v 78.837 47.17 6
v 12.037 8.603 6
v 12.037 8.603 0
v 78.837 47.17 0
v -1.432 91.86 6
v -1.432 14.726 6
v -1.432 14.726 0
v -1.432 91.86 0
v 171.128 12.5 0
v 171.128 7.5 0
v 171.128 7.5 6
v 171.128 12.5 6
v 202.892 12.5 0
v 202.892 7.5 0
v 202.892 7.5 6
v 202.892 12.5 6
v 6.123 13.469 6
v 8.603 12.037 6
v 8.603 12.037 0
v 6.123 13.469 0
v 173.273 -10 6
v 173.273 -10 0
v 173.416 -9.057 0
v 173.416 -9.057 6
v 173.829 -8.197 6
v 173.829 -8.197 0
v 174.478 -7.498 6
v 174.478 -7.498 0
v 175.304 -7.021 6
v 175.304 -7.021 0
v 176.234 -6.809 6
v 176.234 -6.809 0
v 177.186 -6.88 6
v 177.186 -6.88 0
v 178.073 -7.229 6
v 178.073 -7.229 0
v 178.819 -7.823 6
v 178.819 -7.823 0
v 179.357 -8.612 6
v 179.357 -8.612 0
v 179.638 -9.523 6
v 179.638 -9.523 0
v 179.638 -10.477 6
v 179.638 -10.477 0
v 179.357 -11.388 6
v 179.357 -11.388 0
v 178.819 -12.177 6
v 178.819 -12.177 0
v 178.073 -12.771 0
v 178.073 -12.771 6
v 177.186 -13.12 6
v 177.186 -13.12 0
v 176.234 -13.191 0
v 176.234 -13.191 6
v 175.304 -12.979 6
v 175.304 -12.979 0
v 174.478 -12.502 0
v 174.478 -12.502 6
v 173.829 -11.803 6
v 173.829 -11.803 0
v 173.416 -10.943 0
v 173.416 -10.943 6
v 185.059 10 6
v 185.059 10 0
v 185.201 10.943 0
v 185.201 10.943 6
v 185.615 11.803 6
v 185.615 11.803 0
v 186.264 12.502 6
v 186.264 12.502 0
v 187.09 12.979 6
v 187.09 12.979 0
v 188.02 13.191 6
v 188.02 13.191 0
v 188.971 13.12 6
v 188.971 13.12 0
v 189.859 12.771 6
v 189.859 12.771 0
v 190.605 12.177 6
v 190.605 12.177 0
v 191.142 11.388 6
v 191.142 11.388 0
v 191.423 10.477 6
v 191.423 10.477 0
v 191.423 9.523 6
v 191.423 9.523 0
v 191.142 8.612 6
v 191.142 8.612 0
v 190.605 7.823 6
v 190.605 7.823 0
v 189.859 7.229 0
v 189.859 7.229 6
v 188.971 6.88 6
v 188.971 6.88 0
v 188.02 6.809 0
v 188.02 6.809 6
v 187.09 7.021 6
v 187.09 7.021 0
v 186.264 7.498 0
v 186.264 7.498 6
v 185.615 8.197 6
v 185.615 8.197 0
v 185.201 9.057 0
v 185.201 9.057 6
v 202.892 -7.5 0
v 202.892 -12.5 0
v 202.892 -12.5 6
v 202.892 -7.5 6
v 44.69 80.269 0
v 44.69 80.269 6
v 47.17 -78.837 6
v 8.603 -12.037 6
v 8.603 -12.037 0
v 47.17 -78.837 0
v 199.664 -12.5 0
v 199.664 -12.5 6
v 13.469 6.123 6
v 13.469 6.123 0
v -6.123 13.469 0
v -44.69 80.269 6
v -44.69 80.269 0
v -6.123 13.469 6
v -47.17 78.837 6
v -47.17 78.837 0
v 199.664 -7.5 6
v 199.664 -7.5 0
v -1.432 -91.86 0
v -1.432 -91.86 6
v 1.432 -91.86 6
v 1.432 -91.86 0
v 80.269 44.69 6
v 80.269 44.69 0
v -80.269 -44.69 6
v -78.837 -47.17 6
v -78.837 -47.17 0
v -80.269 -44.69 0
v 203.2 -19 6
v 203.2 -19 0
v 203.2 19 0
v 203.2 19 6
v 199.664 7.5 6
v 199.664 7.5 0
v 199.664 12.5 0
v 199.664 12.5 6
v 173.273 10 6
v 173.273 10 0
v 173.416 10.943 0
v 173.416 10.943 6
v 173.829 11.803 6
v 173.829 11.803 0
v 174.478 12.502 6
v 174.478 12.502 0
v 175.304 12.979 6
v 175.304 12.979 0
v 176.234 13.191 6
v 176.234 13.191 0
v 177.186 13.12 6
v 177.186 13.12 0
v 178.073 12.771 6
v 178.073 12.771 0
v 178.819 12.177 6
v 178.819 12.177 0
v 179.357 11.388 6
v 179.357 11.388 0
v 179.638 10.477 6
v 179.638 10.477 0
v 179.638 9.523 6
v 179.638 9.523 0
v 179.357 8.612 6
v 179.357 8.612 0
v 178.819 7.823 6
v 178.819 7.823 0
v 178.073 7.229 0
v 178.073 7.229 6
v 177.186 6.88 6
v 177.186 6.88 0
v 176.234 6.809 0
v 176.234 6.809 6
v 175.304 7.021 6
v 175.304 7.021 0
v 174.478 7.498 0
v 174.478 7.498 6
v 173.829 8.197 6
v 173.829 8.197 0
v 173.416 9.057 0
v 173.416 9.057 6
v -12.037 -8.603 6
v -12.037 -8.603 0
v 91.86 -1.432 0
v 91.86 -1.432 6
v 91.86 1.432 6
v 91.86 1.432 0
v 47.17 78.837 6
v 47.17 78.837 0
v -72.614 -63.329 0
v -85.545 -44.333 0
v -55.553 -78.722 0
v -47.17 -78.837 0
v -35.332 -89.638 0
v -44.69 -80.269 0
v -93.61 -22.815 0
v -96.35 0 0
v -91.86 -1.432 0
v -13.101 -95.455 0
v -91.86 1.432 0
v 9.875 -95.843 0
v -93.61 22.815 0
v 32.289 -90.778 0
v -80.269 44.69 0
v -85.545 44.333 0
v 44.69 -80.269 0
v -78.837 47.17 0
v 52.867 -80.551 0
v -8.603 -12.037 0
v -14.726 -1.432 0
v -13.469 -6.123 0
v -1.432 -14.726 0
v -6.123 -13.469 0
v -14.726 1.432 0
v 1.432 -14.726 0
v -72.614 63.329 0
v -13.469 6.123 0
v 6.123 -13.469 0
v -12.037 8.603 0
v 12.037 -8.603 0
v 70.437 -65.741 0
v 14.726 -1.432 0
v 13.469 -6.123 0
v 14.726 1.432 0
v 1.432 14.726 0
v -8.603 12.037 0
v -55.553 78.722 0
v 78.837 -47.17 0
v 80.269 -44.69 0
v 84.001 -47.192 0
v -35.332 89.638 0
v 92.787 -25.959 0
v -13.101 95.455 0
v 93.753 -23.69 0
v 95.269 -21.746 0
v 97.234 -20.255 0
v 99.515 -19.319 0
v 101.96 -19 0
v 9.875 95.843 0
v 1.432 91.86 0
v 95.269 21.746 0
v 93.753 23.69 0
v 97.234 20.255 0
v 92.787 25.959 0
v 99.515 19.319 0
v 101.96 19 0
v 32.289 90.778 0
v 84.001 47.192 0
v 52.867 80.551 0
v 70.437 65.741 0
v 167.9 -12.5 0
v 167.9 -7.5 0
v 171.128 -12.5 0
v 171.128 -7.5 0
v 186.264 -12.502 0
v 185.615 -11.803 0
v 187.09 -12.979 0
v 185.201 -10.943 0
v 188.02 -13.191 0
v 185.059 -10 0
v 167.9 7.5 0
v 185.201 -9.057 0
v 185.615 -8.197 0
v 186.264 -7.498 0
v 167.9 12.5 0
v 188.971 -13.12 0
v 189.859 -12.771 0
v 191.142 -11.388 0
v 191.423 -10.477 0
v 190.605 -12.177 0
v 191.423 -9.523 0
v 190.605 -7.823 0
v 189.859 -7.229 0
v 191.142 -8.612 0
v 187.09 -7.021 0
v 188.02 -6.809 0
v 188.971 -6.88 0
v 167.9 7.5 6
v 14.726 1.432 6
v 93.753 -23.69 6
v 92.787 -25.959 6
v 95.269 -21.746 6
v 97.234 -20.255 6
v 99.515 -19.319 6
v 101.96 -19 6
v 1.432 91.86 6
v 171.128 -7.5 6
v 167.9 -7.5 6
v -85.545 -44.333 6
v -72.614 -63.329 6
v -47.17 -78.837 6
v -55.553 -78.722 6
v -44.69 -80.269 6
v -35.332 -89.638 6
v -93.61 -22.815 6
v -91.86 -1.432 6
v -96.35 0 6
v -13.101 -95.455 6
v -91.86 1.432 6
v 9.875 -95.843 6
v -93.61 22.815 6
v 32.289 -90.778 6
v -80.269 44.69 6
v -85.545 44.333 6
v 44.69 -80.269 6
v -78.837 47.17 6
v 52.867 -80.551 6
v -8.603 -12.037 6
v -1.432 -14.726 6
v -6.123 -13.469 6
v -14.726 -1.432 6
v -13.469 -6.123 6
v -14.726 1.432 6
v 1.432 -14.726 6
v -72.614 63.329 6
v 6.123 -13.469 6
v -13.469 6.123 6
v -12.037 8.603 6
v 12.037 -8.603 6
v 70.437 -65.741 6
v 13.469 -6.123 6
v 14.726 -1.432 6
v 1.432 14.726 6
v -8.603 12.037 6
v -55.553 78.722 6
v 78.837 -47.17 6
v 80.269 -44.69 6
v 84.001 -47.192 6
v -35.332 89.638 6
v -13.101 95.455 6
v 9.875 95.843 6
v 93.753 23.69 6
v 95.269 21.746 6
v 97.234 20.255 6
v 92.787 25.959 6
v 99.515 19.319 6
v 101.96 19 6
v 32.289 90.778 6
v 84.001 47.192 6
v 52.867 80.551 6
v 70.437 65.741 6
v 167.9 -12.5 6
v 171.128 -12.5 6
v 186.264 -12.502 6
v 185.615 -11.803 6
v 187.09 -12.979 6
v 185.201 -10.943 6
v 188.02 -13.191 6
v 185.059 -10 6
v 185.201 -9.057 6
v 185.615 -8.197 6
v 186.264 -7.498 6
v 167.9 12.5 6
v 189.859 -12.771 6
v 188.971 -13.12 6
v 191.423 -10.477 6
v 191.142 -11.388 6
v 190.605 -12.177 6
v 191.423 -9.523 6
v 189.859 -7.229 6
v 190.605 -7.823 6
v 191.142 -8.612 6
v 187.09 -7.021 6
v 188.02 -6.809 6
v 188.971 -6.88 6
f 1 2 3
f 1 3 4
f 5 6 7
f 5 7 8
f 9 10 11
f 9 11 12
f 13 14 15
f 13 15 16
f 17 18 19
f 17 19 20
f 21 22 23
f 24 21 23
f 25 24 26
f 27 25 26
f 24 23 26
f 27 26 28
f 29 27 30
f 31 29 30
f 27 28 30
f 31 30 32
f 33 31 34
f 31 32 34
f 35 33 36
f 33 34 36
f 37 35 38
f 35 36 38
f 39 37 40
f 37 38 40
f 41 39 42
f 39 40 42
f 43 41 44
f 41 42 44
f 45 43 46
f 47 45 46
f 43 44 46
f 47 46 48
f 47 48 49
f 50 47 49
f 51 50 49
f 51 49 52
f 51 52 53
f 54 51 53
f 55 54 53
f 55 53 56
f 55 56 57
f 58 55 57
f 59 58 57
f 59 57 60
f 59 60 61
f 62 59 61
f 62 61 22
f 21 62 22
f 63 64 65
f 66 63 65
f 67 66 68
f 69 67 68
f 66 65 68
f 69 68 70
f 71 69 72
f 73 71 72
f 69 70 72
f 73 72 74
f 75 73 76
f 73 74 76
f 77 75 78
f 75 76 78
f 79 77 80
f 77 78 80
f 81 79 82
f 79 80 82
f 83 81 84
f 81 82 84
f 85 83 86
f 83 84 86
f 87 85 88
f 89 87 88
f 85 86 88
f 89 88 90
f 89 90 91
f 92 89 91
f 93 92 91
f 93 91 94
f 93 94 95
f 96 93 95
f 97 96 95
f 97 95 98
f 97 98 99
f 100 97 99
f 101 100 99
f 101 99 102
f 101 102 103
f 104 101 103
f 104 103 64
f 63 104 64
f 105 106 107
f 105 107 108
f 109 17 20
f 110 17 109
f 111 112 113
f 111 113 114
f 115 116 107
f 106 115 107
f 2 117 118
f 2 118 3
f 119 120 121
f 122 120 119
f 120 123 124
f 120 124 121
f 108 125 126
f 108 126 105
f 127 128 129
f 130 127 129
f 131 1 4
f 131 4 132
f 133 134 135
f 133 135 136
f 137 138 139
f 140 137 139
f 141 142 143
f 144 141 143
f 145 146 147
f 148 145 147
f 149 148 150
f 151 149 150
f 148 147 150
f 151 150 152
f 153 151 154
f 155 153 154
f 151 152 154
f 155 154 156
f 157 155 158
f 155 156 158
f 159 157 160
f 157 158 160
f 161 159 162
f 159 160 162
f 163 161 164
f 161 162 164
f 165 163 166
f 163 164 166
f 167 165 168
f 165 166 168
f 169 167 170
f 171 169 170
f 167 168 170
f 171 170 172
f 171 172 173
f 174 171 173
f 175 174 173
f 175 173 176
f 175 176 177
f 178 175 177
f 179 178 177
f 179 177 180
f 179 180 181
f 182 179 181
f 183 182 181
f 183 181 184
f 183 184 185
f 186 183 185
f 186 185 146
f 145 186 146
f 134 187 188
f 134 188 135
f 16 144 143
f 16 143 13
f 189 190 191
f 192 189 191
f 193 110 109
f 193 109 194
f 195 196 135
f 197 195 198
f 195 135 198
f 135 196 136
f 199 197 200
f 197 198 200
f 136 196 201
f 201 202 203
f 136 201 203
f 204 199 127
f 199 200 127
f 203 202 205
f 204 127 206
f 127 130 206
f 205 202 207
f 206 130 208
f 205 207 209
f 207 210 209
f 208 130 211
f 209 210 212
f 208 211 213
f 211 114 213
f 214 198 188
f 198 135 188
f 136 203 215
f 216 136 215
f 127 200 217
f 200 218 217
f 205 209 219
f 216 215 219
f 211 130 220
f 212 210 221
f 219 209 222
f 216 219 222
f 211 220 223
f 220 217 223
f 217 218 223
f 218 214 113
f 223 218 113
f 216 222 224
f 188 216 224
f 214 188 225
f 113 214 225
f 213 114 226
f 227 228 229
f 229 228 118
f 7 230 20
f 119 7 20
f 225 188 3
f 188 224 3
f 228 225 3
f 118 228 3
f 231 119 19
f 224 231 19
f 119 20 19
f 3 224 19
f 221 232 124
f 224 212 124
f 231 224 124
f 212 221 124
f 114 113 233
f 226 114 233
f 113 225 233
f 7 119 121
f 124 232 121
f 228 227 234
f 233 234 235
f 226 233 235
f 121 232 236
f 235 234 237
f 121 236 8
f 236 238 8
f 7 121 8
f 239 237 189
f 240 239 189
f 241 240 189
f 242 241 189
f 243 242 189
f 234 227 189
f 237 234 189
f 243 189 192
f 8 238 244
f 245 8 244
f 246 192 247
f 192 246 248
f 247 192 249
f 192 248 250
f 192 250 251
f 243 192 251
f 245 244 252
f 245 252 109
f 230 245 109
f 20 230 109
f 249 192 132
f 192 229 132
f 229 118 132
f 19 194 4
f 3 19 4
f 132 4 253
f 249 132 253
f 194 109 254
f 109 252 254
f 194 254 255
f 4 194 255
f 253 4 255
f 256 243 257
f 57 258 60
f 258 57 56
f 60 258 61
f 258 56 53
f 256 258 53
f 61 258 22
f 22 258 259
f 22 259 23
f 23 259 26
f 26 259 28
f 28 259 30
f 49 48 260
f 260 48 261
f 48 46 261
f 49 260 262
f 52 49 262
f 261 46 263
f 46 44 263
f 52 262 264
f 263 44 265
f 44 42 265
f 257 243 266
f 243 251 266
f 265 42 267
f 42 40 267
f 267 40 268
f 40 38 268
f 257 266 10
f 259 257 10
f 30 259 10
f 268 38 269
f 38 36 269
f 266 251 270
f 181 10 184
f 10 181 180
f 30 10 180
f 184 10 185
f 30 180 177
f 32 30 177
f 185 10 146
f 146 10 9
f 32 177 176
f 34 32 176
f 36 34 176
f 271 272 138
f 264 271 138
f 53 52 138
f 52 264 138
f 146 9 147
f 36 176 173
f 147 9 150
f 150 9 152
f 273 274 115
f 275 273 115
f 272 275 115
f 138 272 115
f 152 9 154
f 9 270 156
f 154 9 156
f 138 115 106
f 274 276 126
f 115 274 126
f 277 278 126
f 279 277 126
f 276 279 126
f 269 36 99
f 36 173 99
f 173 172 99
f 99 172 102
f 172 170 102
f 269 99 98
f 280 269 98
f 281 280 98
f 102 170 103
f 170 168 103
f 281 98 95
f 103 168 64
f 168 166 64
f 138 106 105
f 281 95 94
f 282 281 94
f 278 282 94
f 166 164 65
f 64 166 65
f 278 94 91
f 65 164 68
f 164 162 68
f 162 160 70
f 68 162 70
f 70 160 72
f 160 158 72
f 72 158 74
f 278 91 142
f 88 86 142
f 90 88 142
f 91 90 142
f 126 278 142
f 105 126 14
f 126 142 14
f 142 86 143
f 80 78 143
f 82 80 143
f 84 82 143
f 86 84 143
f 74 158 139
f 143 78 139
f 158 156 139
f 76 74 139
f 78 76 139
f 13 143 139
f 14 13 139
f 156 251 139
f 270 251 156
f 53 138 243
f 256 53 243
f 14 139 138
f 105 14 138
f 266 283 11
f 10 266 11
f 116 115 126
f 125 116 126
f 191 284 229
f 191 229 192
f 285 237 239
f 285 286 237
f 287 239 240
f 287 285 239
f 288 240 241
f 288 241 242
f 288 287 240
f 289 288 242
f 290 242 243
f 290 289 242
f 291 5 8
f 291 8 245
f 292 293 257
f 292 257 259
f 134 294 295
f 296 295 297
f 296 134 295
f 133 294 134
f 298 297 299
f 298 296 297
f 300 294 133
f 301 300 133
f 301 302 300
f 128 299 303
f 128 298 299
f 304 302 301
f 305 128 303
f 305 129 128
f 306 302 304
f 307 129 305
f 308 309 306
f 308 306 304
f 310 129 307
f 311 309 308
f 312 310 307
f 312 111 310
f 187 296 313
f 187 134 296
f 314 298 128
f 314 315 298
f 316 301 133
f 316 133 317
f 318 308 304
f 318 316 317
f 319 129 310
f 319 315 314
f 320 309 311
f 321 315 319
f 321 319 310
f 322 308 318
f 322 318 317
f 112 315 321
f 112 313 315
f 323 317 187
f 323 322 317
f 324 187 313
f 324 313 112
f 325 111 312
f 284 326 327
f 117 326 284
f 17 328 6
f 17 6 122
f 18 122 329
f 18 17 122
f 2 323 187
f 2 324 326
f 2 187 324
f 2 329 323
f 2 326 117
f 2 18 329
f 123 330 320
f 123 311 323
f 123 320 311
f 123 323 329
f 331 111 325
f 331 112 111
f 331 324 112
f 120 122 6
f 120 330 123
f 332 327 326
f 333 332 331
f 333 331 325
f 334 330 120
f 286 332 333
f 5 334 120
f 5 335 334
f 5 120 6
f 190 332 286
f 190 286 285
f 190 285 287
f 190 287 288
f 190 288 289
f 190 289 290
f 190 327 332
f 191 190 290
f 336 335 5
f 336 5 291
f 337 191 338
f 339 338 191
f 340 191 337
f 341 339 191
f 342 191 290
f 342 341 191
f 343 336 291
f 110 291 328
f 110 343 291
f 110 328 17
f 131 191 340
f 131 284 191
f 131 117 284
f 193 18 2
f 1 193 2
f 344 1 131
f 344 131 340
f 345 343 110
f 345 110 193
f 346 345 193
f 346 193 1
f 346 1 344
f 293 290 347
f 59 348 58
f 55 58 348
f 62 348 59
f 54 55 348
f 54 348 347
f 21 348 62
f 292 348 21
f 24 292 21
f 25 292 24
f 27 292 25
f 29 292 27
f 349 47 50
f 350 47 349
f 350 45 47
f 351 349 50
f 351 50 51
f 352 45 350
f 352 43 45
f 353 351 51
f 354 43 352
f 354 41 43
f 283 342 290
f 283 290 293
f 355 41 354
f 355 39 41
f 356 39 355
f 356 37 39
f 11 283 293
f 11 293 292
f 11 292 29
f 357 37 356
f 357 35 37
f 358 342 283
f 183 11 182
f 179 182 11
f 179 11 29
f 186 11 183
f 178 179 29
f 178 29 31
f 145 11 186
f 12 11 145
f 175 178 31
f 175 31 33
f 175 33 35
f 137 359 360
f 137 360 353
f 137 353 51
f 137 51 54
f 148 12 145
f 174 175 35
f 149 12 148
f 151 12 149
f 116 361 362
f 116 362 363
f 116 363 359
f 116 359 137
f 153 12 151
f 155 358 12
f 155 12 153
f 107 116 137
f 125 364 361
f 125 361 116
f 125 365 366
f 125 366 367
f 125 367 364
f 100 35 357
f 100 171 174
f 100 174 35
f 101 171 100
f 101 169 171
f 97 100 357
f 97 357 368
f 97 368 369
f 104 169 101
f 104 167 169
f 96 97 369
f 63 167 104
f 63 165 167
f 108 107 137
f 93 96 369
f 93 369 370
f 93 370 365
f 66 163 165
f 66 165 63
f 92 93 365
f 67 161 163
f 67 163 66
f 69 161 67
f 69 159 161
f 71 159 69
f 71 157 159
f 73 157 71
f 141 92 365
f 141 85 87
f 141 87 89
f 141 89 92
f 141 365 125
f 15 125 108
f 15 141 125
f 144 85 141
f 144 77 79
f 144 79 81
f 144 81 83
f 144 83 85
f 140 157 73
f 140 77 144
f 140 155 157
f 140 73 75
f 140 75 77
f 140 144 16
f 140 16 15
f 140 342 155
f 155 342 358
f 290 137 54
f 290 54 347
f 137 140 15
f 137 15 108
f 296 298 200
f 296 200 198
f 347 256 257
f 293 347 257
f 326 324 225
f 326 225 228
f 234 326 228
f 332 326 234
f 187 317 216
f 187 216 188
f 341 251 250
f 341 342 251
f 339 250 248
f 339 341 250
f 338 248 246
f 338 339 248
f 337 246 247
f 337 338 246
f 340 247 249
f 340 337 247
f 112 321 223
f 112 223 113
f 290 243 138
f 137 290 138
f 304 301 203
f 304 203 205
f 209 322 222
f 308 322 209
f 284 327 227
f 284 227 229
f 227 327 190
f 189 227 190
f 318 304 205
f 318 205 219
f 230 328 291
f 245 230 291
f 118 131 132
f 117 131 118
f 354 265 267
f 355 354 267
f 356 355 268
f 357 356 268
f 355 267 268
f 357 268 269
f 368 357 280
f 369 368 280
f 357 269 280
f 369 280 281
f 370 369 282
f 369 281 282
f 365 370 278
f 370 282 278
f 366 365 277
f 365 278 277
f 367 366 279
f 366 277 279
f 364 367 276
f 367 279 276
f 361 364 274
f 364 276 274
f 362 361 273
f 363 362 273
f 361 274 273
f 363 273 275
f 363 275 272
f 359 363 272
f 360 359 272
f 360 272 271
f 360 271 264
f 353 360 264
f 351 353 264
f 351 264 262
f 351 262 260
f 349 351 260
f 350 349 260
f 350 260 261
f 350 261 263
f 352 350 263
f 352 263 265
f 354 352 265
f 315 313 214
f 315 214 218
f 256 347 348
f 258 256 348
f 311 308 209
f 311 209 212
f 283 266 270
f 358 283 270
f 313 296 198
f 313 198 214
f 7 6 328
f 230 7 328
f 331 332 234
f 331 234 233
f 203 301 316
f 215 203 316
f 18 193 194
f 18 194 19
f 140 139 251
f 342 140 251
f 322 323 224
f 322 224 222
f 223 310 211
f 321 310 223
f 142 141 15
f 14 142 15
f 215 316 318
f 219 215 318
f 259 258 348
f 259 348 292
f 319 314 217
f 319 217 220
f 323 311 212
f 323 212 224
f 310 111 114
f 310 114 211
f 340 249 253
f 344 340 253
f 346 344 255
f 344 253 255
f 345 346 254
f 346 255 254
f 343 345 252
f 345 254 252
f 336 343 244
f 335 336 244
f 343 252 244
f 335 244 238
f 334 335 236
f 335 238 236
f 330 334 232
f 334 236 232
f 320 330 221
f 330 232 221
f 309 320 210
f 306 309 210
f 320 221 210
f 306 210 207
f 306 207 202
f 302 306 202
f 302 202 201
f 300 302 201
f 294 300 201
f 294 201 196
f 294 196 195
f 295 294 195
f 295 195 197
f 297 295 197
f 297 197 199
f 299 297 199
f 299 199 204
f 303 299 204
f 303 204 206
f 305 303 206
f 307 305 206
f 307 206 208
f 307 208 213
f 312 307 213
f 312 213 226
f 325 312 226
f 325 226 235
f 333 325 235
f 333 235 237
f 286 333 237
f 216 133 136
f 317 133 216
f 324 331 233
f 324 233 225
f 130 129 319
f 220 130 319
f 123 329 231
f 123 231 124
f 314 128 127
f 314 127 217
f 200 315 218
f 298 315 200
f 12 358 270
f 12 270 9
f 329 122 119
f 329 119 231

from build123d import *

# Parameters (mm, degrees)
SKETCH1_R                  = 96.35000288
BOSS_EXTRUDE1_DEPTH        = 6
SKETCH2_W                  = 2.86385
SKETCH2_H                  = 77.133562268
SKETCH2_W_2                = 77.133562268
SKETCH2_H_2                = 2.86385
CUT_EXTRUDE1_DEPTH         = 137.391517735
SKETCH3_W                  = 3.227804403
SKETCH3_H                  = 5
BOSS_EXTRUDE2_DEPTH        = 6
FILLET1_R                  = 9.525
F_6_4_6_4_DIAMETER_HOLE1_D = 6.4


with BuildPart() as part:
    # Sketch1 → Boss-Extrude1 (new body)
    with BuildSketch(Plane.XY):
        Circle(SKETCH1_R)
    extrude(amount=BOSS_EXTRUDE1_DEPTH)

    # Sketch2 → Cut-Extrude1 (cut, through all)
    with BuildSketch(Plane.XY.offset(6)):
        Polygon((6.122886862, 13.469001133), (44.689667996, 80.268625542), (47.169834848, 78.836700542), (8.603053714, 12.037076133), align=None)
        with Locations((0, 53.29272171)):
            Rectangle(SKETCH2_W, SKETCH2_H)
        Polygon((12.037076133, 8.603053714), (78.836700542, 47.169834848), (80.268625542, 44.689667996), (13.469001133, 6.122886862), align=None)
        with Locations((53.29272171, 0)):
            Rectangle(SKETCH2_W_2, SKETCH2_H_2)
        Polygon((13.469001133, -6.122886862), (80.268625542, -44.689667996), (78.836700542, -47.169834848), (12.037076133, -8.603053714), align=None)
        Polygon((8.603053714, -12.037076133), (47.169834848, -78.836700542), (44.689667996, -80.268625542), (6.122886862, -13.469001133), align=None)
        with Locations((0, -53.29272171)):
            Rectangle(SKETCH2_W, SKETCH2_H)
        Polygon((-6.122886862, -13.469001133), (-44.689667996, -80.268625542), (-47.169834848, -78.836700542), (-8.603053714, -12.037076133), align=None)
        Polygon((-12.037076133, -8.603053714), (-78.836700542, -47.169834848), (-80.268625542, -44.689667996), (-13.469001133, -6.122886862), align=None)
        with Locations((-53.29272171, 0)):
            Rectangle(SKETCH2_W_2, SKETCH2_H_2)
        Polygon((-13.469001133, 6.122886862), (-80.268625542, 44.689667996), (-78.836700542, 47.169834848), (-12.037076133, 8.603053714), align=None)
        Polygon((-8.603053714, 12.037076133), (-47.169834848, 78.836700542), (-44.689667996, 80.268625542), (-6.122886862, 13.469001133), align=None)
    extrude(amount=-CUT_EXTRUDE1_DEPTH, mode=Mode.SUBTRACT)

    # Sketch3 → Boss-Extrude2 (add)
    with BuildSketch(Plane.XY):
        with BuildLine():
            Line((203.2, 19), (94.45804918, 19))
            ThreePointArc((94.45804918, 19), (96.35000288, 0), (94.45804918, -19))
            Line((94.45804918, -19), (203.2, -19))
            Line((203.2, -19), (203.2, 19))
        make_face()
        with Locations((169.513902202, 10)):
            Rectangle(SKETCH3_W, SKETCH3_H, mode=Mode.SUBTRACT)
        with Locations((169.513902202, -10)):
            Rectangle(SKETCH3_W, SKETCH3_H, mode=Mode.SUBTRACT)
        with Locations((201.278368296, 10)):
            Rectangle(SKETCH3_W, SKETCH3_H, mode=Mode.SUBTRACT)
        with Locations((201.278368296, -10)):
            Rectangle(SKETCH3_W, SKETCH3_H, mode=Mode.SUBTRACT)
    extrude(amount=BOSS_EXTRUDE2_DEPTH)

    # Fillet1
    fillet1_edges = [part.edges().sort_by_distance(p)[0] for p in [
        (94.45804918, -19, 3),
        (94.45804918, 19, 3),
    ]]
    fillet(fillet1_edges, radius=FILLET1_R)

    # Ø6.4 (6.4) Diameter Hole1 (through all)
    with Locations(Plane.XY.offset(6)):
        with Locations((188.25889108, -10), (176.473462737, -10), (176.473462737, 10), (188.25889108, 10)):
            Hole(F_6_4_6_4_DIAMETER_HOLE1_D / 2)


solid = part.part
